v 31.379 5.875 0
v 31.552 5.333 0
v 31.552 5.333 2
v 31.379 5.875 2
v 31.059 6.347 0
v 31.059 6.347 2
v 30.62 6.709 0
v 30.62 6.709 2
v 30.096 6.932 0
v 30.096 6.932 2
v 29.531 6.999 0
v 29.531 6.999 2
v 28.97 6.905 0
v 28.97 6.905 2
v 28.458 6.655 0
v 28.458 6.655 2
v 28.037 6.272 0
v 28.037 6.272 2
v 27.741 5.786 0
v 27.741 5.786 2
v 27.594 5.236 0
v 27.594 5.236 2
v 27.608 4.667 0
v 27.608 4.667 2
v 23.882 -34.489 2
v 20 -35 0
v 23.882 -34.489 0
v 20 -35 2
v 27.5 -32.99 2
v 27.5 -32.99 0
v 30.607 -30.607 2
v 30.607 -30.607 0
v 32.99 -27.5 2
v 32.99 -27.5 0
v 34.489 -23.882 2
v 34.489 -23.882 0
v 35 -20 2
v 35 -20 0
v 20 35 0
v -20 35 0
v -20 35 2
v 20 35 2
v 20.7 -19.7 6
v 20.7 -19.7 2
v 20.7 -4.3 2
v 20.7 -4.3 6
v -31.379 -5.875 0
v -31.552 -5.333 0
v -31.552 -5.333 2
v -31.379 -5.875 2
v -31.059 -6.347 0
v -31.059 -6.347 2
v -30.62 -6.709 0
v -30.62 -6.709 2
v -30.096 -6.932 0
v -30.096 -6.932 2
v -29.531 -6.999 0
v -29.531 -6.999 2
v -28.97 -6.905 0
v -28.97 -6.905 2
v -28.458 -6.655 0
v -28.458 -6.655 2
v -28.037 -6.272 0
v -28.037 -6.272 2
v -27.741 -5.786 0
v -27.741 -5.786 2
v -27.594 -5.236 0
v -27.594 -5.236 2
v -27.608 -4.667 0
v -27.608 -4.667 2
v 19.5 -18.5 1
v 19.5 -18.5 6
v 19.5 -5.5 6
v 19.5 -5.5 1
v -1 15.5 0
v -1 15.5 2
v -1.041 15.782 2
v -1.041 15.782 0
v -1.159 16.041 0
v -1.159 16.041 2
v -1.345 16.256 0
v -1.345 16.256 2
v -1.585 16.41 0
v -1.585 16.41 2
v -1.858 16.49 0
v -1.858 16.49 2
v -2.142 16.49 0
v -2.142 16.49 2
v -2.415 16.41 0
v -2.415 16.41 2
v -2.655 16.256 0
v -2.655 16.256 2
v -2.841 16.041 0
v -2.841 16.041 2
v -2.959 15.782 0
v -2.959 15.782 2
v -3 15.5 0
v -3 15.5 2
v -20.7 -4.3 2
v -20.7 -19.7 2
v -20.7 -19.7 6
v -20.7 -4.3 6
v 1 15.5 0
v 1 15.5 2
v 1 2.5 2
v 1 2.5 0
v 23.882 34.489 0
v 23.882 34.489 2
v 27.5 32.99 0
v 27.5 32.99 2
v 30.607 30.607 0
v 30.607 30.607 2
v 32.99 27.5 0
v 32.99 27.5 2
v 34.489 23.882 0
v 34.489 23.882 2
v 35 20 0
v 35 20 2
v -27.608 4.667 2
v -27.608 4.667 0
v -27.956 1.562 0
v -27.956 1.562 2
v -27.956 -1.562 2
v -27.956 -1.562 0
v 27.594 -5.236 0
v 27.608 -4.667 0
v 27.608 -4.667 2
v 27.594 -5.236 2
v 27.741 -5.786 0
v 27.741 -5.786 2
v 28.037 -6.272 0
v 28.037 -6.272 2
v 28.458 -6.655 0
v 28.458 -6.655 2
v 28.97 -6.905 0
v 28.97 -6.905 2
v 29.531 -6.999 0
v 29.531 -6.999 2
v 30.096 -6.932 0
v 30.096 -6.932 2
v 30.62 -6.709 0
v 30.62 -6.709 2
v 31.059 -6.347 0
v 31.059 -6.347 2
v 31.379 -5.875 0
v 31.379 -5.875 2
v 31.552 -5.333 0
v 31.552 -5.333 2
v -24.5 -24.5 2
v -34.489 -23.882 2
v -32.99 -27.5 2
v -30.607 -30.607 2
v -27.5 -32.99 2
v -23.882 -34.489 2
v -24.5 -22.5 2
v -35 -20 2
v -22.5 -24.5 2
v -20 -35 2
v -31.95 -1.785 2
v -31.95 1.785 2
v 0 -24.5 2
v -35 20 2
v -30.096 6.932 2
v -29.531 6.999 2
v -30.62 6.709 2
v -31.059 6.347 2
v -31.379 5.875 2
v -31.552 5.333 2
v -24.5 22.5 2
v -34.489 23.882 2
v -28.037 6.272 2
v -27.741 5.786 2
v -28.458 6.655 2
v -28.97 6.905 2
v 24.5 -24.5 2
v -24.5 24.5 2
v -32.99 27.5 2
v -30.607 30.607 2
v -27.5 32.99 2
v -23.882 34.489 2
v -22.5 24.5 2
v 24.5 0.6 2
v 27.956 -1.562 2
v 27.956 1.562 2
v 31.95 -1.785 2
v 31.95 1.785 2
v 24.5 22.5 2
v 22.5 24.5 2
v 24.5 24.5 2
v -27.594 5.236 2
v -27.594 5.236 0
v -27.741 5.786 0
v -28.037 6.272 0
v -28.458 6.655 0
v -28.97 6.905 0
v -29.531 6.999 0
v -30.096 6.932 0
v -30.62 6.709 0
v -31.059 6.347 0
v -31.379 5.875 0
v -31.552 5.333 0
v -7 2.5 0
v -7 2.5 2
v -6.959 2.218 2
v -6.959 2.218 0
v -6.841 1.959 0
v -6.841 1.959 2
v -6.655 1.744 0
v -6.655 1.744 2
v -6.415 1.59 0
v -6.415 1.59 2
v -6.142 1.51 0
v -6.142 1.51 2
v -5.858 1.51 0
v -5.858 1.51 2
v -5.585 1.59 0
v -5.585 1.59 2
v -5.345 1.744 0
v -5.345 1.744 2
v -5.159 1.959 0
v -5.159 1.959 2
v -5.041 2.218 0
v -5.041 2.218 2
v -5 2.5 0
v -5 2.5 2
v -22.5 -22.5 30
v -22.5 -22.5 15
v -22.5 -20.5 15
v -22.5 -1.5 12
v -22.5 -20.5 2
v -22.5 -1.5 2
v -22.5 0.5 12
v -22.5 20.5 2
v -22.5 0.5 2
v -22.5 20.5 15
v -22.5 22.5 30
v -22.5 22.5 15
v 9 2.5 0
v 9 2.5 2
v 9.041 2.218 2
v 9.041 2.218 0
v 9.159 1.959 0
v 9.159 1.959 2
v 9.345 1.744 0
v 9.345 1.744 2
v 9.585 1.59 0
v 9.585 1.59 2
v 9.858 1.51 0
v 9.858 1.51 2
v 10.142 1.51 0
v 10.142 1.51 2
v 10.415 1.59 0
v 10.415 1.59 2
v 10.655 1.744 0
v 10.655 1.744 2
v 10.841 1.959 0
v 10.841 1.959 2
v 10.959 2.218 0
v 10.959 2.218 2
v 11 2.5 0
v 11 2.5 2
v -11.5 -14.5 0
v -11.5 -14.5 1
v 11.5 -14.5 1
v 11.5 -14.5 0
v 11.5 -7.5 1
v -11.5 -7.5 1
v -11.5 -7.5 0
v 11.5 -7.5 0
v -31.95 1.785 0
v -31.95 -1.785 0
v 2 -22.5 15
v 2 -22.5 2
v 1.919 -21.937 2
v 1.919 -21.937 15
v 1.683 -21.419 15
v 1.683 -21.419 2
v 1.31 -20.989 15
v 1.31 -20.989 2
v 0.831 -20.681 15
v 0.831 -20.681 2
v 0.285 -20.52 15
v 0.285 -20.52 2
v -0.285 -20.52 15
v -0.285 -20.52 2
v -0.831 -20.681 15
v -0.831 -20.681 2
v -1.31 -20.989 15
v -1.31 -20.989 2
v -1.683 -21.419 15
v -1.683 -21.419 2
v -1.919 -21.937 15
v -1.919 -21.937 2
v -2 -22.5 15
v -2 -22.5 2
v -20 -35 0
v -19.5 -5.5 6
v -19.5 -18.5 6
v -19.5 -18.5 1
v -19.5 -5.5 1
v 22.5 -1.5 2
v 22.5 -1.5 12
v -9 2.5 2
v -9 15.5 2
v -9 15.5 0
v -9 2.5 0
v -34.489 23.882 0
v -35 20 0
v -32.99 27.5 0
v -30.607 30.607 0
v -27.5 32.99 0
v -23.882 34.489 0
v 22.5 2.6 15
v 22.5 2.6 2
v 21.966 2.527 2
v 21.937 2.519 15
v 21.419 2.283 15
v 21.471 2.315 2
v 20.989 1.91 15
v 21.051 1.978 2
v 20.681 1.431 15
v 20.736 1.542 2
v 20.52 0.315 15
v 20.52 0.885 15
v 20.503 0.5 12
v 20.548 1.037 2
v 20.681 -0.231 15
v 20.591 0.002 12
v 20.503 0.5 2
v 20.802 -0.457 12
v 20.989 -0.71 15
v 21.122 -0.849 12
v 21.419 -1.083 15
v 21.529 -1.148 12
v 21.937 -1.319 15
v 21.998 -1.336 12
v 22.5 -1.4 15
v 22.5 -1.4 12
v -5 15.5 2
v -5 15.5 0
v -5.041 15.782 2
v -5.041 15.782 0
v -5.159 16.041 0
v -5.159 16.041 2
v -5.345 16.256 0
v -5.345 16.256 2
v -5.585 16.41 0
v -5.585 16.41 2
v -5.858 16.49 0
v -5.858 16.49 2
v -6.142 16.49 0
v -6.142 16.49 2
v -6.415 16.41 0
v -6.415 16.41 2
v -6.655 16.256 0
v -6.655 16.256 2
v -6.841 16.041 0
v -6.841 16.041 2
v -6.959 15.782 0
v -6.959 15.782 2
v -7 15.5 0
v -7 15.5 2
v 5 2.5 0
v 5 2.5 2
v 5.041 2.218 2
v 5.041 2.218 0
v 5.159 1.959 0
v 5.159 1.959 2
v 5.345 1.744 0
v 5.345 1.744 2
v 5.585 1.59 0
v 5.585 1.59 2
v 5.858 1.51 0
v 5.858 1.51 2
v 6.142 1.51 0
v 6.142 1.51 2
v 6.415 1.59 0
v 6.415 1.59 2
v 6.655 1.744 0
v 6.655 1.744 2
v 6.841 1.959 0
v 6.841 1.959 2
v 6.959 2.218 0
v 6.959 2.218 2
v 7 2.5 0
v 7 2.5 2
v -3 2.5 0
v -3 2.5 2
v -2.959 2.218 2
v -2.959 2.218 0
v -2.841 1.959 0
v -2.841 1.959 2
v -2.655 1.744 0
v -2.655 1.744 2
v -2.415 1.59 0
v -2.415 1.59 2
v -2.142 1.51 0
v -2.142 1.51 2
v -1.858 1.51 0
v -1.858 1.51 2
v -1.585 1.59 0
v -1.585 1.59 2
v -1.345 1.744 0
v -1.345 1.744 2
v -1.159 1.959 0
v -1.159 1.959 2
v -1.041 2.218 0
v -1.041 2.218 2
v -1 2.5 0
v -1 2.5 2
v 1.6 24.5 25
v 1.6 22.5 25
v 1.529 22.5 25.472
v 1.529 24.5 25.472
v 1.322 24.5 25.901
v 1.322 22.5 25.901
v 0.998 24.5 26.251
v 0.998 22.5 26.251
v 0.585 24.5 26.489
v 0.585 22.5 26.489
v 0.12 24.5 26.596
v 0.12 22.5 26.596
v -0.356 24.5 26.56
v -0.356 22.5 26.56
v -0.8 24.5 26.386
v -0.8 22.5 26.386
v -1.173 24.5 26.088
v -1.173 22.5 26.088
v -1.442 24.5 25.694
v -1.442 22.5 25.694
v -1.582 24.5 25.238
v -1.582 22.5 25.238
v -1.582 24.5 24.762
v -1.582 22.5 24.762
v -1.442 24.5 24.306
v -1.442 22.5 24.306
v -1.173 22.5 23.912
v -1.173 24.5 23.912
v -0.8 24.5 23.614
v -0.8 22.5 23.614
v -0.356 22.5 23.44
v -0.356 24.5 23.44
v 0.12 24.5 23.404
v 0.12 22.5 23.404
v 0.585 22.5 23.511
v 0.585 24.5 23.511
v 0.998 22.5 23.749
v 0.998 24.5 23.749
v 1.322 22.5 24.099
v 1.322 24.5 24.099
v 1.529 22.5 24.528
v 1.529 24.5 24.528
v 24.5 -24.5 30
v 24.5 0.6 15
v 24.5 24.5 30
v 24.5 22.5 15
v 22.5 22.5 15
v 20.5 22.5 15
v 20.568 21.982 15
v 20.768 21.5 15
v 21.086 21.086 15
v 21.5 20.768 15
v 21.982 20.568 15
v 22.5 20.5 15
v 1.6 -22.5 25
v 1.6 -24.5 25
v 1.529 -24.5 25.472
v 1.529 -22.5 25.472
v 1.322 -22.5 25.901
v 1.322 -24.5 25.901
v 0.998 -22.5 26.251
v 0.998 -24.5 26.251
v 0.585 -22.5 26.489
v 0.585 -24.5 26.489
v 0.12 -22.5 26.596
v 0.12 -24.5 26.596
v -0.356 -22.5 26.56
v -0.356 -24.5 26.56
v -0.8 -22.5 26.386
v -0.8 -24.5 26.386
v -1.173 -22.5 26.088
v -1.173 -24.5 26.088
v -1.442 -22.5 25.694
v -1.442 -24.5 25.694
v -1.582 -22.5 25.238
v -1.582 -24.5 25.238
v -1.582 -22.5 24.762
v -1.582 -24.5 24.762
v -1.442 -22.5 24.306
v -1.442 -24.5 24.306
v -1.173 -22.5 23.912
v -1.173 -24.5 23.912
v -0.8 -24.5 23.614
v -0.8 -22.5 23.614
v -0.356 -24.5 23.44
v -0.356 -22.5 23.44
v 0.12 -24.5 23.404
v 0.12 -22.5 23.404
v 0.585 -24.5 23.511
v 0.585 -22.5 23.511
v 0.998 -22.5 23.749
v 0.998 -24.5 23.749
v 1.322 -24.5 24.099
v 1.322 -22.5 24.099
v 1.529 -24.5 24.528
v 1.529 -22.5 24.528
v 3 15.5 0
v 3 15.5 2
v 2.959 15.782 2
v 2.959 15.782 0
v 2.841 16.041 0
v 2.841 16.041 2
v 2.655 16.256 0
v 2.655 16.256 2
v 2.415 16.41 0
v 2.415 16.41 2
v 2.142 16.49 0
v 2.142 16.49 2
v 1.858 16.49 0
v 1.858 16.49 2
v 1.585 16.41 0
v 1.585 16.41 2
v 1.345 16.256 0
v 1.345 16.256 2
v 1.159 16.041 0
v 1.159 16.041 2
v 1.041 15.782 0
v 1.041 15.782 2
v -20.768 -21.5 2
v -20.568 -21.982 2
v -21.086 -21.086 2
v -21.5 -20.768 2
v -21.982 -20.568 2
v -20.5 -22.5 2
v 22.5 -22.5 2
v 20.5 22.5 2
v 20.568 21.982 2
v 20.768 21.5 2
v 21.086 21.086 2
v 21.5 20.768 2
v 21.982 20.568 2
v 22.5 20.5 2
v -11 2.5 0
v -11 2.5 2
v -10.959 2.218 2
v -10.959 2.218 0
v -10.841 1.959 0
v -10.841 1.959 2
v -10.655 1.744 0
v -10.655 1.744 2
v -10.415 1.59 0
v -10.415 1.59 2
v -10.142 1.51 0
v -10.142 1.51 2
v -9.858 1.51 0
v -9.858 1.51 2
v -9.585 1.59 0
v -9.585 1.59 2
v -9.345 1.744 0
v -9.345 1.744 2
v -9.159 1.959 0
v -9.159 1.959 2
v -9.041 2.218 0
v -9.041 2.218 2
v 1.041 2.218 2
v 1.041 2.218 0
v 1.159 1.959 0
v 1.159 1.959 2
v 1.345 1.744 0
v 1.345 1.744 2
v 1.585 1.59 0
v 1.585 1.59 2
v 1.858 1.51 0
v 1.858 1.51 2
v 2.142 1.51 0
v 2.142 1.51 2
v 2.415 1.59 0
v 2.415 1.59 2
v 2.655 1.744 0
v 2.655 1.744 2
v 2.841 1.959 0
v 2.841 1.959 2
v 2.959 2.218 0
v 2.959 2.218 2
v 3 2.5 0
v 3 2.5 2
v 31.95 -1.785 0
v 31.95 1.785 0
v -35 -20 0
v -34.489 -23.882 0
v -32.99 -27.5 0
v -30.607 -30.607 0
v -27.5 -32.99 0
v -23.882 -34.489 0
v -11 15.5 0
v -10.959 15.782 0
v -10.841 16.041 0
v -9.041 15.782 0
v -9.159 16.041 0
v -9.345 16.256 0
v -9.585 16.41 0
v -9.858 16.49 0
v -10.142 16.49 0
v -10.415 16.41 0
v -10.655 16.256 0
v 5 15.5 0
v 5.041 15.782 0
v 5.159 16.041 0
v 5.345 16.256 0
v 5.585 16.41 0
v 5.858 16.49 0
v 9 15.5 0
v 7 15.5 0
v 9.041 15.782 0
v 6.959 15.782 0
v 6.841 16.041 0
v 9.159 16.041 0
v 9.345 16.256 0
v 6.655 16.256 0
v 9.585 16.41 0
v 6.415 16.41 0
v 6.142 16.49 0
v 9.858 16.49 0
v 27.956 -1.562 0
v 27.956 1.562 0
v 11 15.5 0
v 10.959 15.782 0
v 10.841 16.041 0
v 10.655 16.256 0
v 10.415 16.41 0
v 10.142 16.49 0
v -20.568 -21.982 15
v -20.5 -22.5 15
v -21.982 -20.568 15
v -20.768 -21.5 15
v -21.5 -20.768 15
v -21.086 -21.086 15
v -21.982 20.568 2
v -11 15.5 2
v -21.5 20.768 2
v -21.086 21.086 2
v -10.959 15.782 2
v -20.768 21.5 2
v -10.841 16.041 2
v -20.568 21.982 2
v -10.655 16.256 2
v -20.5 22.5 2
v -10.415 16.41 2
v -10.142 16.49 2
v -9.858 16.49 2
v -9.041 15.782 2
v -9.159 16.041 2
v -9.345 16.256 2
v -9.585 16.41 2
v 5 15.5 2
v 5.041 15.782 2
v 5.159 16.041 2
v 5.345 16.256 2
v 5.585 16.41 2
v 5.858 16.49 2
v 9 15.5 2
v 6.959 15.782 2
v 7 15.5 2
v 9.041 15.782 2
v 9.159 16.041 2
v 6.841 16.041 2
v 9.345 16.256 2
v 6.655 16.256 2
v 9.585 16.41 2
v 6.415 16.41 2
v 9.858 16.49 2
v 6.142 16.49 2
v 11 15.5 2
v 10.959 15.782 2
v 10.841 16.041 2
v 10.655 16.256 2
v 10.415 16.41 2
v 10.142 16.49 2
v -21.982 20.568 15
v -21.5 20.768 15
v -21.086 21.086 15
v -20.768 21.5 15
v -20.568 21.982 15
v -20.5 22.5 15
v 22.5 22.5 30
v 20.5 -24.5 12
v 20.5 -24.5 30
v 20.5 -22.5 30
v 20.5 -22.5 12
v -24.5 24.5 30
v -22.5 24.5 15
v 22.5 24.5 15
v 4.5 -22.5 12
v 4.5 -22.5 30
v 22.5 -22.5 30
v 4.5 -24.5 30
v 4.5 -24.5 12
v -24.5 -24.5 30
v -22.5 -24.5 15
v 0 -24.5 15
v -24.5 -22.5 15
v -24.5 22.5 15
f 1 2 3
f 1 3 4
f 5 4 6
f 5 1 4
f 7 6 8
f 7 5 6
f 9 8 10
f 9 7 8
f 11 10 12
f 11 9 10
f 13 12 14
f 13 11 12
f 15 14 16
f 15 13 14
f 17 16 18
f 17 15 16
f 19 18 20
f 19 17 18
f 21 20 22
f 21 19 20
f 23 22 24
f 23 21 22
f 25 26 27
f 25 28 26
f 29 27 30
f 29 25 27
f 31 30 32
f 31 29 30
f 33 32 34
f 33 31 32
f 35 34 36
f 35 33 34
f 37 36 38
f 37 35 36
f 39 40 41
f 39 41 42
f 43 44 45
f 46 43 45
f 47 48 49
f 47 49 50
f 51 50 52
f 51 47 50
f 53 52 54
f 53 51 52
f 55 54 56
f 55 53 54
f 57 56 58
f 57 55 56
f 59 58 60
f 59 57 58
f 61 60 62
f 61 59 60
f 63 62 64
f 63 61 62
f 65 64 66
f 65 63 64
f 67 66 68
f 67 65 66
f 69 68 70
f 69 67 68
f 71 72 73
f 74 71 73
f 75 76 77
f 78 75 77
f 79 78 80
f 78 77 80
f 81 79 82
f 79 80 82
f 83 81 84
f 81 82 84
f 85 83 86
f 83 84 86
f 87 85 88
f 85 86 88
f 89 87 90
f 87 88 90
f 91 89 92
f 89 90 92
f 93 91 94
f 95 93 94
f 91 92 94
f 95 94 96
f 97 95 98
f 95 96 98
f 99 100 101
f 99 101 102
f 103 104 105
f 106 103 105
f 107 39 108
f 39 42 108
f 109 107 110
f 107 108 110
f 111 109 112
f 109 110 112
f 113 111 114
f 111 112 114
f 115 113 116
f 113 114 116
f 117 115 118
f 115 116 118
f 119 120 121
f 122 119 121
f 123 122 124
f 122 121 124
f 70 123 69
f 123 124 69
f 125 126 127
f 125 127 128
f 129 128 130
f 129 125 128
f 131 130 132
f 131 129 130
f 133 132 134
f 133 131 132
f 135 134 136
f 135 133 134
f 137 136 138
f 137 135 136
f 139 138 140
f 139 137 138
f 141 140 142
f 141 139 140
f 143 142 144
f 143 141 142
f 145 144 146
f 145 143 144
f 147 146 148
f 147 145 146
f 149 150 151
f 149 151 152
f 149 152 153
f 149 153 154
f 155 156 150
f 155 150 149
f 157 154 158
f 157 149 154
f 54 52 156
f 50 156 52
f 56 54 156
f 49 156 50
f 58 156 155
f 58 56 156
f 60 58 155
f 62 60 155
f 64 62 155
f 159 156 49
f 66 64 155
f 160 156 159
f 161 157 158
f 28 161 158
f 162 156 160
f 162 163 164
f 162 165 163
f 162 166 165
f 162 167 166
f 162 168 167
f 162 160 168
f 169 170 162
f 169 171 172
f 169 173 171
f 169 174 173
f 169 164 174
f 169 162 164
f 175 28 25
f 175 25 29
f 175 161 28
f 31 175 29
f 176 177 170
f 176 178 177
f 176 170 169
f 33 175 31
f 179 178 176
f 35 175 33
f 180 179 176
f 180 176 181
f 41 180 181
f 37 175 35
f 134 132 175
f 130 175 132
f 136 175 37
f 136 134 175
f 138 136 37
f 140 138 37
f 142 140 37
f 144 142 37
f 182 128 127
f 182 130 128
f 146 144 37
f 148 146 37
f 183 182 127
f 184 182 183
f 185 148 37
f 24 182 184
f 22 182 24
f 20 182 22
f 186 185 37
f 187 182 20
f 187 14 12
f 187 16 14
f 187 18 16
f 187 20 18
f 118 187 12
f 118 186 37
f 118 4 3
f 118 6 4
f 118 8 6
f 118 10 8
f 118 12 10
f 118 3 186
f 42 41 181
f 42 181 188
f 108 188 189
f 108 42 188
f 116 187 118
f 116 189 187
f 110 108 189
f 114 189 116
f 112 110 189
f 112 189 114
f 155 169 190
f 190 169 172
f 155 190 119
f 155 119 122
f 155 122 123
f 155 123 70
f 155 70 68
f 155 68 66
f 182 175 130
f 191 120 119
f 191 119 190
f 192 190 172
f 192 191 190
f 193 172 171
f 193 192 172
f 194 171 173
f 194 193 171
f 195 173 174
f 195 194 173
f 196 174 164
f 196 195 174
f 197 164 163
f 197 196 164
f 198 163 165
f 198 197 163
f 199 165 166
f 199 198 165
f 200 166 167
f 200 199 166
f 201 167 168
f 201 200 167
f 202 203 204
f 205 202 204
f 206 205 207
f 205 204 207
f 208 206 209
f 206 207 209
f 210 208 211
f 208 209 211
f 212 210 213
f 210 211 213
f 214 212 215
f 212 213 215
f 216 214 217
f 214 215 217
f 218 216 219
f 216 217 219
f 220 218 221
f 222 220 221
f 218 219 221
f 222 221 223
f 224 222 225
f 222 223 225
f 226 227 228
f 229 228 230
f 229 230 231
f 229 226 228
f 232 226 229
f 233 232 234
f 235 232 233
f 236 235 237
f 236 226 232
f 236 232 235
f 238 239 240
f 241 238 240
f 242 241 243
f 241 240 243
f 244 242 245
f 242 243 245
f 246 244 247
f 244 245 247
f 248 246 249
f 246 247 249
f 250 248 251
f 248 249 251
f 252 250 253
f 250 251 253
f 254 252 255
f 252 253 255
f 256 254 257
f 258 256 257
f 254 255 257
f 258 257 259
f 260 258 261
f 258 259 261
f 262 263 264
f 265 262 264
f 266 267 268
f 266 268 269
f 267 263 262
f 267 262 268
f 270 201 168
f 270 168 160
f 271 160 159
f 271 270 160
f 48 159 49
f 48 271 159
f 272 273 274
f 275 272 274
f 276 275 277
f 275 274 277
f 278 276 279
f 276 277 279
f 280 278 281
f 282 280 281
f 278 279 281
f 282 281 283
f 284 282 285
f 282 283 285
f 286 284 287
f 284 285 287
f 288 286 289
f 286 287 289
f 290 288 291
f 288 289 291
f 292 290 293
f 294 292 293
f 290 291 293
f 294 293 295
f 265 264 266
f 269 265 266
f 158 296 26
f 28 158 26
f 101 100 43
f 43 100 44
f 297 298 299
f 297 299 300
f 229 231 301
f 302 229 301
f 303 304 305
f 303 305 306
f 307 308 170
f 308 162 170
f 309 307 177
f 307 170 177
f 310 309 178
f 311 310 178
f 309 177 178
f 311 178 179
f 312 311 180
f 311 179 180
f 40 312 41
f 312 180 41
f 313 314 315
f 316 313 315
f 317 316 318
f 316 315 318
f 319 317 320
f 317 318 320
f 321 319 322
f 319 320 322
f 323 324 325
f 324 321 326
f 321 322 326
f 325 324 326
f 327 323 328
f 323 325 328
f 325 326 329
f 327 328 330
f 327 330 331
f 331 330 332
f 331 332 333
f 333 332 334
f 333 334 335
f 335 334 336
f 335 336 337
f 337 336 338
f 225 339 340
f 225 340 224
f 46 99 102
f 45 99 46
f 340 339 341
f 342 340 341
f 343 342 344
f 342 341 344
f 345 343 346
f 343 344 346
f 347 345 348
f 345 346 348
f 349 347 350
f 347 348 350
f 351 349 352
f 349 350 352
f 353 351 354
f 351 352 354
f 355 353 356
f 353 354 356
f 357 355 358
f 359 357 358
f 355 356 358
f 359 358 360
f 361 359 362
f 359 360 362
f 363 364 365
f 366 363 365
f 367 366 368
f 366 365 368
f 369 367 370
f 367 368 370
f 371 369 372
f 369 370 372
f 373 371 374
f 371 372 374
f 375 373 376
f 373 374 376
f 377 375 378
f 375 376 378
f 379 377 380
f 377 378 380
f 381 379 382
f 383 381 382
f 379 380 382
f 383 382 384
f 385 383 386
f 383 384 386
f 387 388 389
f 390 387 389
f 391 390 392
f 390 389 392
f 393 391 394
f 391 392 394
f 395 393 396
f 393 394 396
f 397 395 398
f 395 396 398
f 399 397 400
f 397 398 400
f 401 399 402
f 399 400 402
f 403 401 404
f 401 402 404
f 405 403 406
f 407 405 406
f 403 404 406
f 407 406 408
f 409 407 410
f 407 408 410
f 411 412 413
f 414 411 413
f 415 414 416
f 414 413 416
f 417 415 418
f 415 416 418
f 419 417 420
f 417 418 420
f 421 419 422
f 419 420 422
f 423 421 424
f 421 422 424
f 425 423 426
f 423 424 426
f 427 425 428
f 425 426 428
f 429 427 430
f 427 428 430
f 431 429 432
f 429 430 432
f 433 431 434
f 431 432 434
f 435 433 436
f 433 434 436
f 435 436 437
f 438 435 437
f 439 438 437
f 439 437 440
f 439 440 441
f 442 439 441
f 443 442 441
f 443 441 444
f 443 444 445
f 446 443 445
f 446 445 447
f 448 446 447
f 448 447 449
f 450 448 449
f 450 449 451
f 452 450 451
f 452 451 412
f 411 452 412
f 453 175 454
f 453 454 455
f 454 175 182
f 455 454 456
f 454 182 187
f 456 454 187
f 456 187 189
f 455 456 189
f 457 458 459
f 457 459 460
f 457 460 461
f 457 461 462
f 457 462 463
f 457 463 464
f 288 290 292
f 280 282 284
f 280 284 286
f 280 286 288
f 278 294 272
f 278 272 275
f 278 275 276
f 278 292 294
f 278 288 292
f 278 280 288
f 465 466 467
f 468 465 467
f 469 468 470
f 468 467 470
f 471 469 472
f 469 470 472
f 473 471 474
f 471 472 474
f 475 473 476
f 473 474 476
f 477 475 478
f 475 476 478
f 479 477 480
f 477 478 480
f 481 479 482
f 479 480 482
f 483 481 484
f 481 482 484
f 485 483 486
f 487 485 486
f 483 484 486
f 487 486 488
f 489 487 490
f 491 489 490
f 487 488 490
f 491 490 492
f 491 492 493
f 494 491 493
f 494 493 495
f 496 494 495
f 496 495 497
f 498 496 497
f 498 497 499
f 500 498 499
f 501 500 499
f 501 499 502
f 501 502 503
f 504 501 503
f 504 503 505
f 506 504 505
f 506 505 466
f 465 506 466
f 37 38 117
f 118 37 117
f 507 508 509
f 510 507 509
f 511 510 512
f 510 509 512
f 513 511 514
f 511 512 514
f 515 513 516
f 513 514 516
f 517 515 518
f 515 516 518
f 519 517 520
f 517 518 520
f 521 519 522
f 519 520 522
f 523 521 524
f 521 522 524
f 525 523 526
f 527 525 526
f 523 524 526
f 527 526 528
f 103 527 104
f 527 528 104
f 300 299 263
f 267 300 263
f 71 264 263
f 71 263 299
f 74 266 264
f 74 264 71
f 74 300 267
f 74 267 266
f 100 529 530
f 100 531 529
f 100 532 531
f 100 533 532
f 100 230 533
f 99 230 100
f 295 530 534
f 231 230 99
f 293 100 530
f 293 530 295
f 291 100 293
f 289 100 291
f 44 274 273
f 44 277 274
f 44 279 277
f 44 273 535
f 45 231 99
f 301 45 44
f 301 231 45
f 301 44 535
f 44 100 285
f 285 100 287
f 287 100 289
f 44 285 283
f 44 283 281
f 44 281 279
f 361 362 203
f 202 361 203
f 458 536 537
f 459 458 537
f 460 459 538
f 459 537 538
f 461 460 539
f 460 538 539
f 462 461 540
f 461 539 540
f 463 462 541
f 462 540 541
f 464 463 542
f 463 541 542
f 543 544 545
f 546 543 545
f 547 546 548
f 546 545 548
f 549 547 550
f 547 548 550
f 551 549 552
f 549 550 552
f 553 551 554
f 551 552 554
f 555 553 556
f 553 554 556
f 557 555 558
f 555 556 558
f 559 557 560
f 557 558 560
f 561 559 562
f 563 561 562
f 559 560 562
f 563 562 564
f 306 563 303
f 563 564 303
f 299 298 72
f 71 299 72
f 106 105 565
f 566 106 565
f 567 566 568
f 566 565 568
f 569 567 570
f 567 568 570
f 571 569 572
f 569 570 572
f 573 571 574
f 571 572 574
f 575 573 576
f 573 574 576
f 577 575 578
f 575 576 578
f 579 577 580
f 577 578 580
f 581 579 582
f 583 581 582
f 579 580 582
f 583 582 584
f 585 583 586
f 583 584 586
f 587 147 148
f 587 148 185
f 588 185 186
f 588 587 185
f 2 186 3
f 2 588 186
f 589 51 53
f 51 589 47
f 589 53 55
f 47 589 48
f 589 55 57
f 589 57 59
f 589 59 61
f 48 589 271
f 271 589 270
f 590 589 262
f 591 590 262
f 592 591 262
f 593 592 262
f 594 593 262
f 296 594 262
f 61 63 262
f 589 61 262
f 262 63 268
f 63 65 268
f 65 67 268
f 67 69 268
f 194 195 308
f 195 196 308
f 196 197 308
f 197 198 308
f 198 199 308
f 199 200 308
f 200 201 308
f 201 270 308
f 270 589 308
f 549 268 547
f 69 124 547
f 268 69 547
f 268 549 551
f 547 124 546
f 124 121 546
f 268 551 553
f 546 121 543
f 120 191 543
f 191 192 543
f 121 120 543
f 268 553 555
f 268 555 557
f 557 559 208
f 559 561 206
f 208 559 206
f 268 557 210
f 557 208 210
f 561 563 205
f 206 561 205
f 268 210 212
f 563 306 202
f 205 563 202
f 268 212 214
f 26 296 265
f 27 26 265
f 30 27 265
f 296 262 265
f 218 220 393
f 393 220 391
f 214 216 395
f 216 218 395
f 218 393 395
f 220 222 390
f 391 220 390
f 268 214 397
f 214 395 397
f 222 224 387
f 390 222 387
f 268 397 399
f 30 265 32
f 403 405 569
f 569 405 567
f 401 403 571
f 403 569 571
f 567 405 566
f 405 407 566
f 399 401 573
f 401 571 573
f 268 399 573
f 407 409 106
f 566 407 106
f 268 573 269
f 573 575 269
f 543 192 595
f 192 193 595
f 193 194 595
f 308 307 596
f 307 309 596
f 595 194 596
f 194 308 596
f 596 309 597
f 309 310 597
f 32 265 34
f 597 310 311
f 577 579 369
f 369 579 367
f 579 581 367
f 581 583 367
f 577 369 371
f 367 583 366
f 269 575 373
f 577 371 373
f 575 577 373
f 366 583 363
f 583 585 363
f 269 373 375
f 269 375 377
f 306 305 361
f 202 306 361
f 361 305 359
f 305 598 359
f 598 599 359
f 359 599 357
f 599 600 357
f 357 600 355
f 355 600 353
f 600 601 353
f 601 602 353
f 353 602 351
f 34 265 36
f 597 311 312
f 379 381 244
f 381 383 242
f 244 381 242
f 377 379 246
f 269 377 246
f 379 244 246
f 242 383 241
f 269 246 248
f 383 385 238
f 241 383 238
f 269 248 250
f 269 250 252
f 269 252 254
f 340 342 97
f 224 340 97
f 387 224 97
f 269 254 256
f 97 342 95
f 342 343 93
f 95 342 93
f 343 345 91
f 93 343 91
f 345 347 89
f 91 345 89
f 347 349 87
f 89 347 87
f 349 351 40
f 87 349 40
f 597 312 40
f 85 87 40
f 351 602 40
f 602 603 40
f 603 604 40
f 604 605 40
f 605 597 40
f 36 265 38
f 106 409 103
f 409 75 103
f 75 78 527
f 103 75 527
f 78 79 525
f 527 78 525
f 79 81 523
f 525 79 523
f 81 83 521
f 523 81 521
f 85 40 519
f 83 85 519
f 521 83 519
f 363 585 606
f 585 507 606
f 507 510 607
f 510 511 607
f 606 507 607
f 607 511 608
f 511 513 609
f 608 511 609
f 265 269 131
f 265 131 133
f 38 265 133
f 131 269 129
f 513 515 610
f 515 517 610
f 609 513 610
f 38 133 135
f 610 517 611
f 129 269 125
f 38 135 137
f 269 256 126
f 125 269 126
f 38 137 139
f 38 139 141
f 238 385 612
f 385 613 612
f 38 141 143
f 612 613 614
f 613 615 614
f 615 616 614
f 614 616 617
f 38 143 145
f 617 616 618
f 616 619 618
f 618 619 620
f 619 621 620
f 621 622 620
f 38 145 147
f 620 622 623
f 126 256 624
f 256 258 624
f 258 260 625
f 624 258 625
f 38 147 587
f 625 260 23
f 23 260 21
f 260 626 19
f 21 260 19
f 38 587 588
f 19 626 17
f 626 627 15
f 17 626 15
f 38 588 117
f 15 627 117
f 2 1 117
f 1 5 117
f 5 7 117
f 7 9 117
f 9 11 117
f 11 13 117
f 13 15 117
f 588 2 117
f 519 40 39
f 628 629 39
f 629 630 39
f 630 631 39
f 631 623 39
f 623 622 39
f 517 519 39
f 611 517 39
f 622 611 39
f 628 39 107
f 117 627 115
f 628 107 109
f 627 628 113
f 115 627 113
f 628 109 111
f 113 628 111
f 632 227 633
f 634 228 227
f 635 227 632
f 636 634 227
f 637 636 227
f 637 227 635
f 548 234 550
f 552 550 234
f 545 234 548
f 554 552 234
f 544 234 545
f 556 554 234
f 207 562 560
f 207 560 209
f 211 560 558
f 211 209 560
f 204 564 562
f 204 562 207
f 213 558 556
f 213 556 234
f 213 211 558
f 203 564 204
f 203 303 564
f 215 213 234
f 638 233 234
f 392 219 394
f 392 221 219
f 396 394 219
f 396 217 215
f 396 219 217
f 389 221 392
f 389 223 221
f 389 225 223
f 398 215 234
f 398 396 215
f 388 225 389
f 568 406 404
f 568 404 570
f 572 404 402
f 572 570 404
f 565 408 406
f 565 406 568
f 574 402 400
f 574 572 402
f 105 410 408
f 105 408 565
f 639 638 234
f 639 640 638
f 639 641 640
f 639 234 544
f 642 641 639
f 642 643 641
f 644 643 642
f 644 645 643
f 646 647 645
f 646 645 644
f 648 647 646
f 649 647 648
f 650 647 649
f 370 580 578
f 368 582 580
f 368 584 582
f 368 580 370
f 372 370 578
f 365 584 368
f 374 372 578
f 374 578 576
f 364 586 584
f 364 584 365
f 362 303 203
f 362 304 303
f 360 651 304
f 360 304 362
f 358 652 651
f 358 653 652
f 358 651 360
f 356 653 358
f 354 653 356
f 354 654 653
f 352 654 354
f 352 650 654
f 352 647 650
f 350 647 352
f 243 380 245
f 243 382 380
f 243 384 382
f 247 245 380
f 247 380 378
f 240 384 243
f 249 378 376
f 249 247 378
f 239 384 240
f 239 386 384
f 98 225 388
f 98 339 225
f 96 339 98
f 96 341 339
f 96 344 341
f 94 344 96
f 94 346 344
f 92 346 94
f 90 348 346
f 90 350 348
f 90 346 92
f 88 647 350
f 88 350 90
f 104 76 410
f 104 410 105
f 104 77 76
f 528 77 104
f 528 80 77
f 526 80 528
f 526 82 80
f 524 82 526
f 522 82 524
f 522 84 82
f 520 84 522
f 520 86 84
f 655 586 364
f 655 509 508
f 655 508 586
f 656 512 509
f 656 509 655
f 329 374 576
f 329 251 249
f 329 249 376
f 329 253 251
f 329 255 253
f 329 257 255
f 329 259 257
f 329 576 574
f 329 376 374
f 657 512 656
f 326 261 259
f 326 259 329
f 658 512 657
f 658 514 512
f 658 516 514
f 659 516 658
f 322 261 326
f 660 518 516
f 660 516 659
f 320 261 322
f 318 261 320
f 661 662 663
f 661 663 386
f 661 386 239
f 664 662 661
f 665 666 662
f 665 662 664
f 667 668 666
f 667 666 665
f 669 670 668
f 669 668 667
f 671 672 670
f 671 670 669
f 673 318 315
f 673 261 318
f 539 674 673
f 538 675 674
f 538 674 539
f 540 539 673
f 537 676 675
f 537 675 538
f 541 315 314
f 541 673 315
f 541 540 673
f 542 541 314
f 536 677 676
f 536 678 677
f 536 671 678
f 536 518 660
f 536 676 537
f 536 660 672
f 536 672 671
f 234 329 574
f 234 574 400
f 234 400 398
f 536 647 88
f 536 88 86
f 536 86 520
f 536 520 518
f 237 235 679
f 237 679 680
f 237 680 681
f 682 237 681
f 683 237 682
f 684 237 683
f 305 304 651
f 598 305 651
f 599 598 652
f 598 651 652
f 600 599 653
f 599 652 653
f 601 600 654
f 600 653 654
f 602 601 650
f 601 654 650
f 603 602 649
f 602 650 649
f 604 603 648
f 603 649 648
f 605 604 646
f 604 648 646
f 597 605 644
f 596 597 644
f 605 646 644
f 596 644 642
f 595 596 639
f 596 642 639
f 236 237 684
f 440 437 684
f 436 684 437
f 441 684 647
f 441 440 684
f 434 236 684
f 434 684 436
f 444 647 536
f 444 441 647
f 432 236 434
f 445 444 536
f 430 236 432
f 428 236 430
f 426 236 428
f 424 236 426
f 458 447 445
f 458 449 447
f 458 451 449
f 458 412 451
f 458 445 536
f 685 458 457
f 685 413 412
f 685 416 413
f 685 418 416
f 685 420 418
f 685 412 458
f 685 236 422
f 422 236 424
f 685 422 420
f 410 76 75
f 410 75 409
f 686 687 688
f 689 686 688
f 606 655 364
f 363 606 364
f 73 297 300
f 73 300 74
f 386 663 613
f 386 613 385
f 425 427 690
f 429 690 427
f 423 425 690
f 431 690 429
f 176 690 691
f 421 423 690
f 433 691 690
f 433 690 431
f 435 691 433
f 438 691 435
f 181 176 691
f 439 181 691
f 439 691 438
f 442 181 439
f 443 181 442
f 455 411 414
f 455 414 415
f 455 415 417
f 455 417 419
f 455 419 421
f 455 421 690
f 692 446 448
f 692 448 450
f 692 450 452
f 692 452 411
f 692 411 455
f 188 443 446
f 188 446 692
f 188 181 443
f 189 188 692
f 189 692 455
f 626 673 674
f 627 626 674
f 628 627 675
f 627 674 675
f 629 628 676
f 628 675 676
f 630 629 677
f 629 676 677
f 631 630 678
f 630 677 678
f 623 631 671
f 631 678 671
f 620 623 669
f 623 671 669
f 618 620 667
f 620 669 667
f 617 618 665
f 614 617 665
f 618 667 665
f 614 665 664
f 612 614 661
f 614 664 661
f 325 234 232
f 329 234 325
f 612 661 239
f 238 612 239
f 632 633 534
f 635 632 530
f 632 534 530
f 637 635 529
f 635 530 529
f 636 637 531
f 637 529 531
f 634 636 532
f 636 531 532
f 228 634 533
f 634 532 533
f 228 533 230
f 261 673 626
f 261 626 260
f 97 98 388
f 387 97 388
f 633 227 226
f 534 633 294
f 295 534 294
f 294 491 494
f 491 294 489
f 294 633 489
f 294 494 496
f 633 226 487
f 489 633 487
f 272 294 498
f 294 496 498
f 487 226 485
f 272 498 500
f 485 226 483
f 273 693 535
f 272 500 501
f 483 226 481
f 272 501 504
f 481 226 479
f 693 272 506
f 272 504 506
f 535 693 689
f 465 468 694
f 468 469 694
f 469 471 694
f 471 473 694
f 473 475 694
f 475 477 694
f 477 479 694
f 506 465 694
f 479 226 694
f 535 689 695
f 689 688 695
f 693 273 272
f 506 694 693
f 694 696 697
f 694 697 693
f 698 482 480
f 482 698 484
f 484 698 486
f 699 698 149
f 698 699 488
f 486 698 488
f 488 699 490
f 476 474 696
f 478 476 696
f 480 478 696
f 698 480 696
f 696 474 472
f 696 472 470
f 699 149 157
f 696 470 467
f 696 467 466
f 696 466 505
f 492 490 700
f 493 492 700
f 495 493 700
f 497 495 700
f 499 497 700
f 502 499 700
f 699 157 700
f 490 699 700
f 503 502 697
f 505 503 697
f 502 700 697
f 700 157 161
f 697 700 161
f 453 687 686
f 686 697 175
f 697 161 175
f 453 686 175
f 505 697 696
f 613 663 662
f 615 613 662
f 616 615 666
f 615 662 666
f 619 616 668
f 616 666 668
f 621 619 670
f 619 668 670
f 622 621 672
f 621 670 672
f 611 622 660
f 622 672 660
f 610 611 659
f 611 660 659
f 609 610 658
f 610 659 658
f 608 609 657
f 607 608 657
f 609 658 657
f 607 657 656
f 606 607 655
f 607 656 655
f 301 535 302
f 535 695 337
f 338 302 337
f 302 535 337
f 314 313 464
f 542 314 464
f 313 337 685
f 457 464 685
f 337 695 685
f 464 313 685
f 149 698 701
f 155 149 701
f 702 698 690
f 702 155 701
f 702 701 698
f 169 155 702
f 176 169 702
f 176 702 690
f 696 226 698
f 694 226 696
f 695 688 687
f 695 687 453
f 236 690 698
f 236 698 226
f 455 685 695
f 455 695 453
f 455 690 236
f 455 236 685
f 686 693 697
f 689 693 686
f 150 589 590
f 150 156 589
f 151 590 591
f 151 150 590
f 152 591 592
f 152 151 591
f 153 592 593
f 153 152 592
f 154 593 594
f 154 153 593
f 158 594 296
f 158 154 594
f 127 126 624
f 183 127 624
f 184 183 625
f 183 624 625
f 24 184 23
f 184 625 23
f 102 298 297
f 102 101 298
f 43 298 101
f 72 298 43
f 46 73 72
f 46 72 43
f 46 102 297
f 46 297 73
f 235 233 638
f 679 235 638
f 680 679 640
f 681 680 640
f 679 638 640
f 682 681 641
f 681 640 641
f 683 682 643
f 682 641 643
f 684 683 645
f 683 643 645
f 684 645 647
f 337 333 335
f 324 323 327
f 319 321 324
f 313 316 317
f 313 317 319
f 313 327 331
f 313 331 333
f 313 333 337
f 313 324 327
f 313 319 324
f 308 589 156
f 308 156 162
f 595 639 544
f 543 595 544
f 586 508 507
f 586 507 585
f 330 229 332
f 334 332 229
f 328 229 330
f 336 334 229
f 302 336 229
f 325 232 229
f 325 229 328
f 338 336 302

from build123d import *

# Parameters (mm, degrees)
SKETCH_W        = 70
SKETCH_H        = 70
PAD_DEPTH       = 2
SKETCH001_W     = 49
SKETCH001_H     = 49
PAD001_DEPTH    = 28
SKETCH002_W     = 45
SKETCH002_H     = 45
POCKET_DEPTH    = 28
SKETCH003_W     = 16
SKETCH003_H     = 11.09878
POCKET001_DEPTH = 18
SKETCH004_W     = 45
SKETCH004_H     = 2
PAD002_DEPTH    = 10
SKETCH005_W     = 41.4
SKETCH005_H     = 15.4
PAD003_DEPTH    = 4
SKETCH006_W     = 39
SKETCH006_H     = 13
POCKET002_DEPTH = 5
SKETCH007_W     = 23
SKETCH007_H     = 7
POCKET003_DEPTH = 1.001
POCKET004_DEPTH = 5
SKETCH009_R     = 1.6
POCKET005_DEPTH = 59.501
FILLET_R        = 15
SKETCH010_R     = 2
PAD004_DEPTH    = 13


with BuildPart() as part:
    # Sketch → Pad (new body)
    with BuildSketch(Plane.XY):
        Rectangle(SKETCH_W, SKETCH_H)
        with BuildLine():
            ThreePointArc((27.608372, -4.666667), (28, 0), (27.608372, 4.666667))
            ThreePointArc((31.552426, 5.333333), (29.247066, 6.972027), (27.608372, 4.666667))
            ThreePointArc((31.552426, -5.333333), (32, 0), (31.552426, 5.333333))
            ThreePointArc((27.608372, -4.666667), (29.247066, -6.972027), (31.552426, -5.333333))
        make_face(mode=Mode.SUBTRACT)
        with BuildLine():
            ThreePointArc((-27.608372, 4.666667), (-28, 0), (-27.608372, -4.666667))
            ThreePointArc((-31.552426, -5.333333), (-29.247066, -6.972027), (-27.608372, -4.666667))
            ThreePointArc((-31.552426, 5.333333), (-32, 0), (-31.552426, -5.333333))
            ThreePointArc((-27.608372, 4.666667), (-29.247066, 6.972027), (-31.552426, 5.333333))
        make_face(mode=Mode.SUBTRACT)
    extrude(amount=PAD_DEPTH)

    # Sketch001 (on Face14 of Pad) → Pad001 (join)
    with BuildSketch(Plane.XY.offset(2)):
        Rectangle(SKETCH001_W, SKETCH001_H)
    extrude(amount=PAD001_DEPTH)

    # Sketch002 (on Face19 of Pad001) → Pocket (cut)
    with BuildSketch(Plane.XY.offset(30)):
        Rectangle(SKETCH002_W, SKETCH002_H)
    extrude(amount=-POCKET_DEPTH, mode=Mode.SUBTRACT)

    # Sketch003 (on Face19 of Pocket) → Pocket001 (cut)
    with BuildSketch(Plane.XY.offset(30)):
        with Locations((12.5, -23.806966)):
            Rectangle(SKETCH003_W, SKETCH003_H)
    extrude(amount=-POCKET001_DEPTH, mode=Mode.SUBTRACT)

    # Sketch004 (on Face27 of Pocket001) → Pad002 (join)
    with BuildSketch(Plane.XY.offset(2)):
        with Locations((0, -0.5)):
            Rectangle(SKETCH004_W, SKETCH004_H)
    extrude(amount=PAD002_DEPTH)

    # Sketch005 (on Face27 of Pad002) → Pad003 (join)
    with BuildSketch(Plane.XY.offset(2)):
        with Locations((0, -12)):
            Rectangle(SKETCH005_W, SKETCH005_H)
    extrude(amount=PAD003_DEPTH)

    # Sketch006 (on Face36 of Pad003) → Pocket002 (cut)
    with BuildSketch(Plane.XY.offset(6)):
        with Locations((0, -12)):
            Rectangle(SKETCH006_W, SKETCH006_H)
    extrude(amount=-POCKET002_DEPTH, mode=Mode.SUBTRACT)

    # Sketch007 (on Face41 of Pocket002) → Pocket003 (cut, through all)
    with BuildSketch(Plane.XY.offset(1)):
        with Locations((0, -11)):
            Rectangle(SKETCH007_W, SKETCH007_H)
    extrude(amount=-POCKET003_DEPTH, mode=Mode.SUBTRACT)

    # Sketch008 (on Face37 of Pocket003) → Pocket004 (cut)
    with BuildSketch(Plane.XY.offset(2)):
        with BuildLine():
            Line((-11, 15.5), (-11, 2.5))
            ThreePointArc((-11, 2.5), (-10, 1.5), (-9, 2.5))
            Line((-9, 15.5), (-9, 2.5))
            ThreePointArc((-9, 15.5), (-10, 16.5), (-11, 15.5))
        make_face()
        with BuildLine():
            Line((-7, 15.5), (-7, 2.5))
            ThreePointArc((-7, 2.5), (-6, 1.5), (-5, 2.5))
            Line((-5, 15.5), (-5, 2.5))
            ThreePointArc((-5, 15.5), (-6, 16.5), (-7, 15.5))
        make_face()
        with BuildLine():
            Line((-3, 15.5), (-3, 2.5))
            ThreePointArc((-3, 2.5), (-2, 1.5), (-1, 2.5))
            Line((-1, 15.5), (-1, 2.5))
            ThreePointArc((-1, 15.5), (-2, 16.5), (-3, 15.5))
        make_face()
        with BuildLine():
            Line((1, 15.5), (1, 2.5))
            ThreePointArc((1, 2.5), (2, 1.5), (3, 2.5))
            Line((3, 15.5), (3, 2.5))
            ThreePointArc((3, 15.5), (2, 16.5), (1, 15.5))
        make_face()
        with BuildLine():
            Line((5, 15.5), (5, 2.5))
            ThreePointArc((5, 2.5), (6, 1.5), (7, 2.5))
            Line((7, 15.5), (7, 2.5))
            ThreePointArc((7, 15.5), (6, 16.5), (5, 15.5))
        make_face()
        with BuildLine():
            Line((9, 15.5), (9, 2.5))
            ThreePointArc((9, 2.5), (10, 1.5), (11, 2.5))
            Line((11, 15.5), (11, 2.5))
            ThreePointArc((11, 15.5), (10, 16.5), (9, 15.5))
        make_face()
    extrude(amount=-POCKET004_DEPTH, mode=Mode.SUBTRACT)

    # Sketch009 (on Face45 of Pocket004) → Pocket005 (cut, through all)
    with BuildSketch(Plane.XZ.offset(24.5)):
        with Locations((0, 25)):
            Circle(SKETCH009_R)
    extrude(amount=-POCKET005_DEPTH, mode=Mode.SUBTRACT)

    # Fillet
    fillet_edges = [part.edges().sort_by_distance(p)[0] for p in [
        (-35, 35, 1),
        (35, 35, 1),
        (35, -35, 1),
        (-35, -35, 1),
    ]]
    fillet(fillet_edges, radius=FILLET_R)

    # Sketch010 (on Face52 of Fillet) → Pad004 (join)
    with BuildSketch(Plane.XY.offset(2)):
        with Locations((22.5, 22.5)):
            Circle(SKETCH010_R)
        with Locations((-22.5, 22.5)):
            Circle(SKETCH010_R)
        with Locations((22.5, 0.6)):
            Circle(SKETCH010_R)
        with Locations((0, -22.5)):
            Circle(SKETCH010_R)
        with Locations((-22.5, -22.5)):
            Circle(SKETCH010_R)
    extrude(amount=PAD004_DEPTH)


solid = part.part
